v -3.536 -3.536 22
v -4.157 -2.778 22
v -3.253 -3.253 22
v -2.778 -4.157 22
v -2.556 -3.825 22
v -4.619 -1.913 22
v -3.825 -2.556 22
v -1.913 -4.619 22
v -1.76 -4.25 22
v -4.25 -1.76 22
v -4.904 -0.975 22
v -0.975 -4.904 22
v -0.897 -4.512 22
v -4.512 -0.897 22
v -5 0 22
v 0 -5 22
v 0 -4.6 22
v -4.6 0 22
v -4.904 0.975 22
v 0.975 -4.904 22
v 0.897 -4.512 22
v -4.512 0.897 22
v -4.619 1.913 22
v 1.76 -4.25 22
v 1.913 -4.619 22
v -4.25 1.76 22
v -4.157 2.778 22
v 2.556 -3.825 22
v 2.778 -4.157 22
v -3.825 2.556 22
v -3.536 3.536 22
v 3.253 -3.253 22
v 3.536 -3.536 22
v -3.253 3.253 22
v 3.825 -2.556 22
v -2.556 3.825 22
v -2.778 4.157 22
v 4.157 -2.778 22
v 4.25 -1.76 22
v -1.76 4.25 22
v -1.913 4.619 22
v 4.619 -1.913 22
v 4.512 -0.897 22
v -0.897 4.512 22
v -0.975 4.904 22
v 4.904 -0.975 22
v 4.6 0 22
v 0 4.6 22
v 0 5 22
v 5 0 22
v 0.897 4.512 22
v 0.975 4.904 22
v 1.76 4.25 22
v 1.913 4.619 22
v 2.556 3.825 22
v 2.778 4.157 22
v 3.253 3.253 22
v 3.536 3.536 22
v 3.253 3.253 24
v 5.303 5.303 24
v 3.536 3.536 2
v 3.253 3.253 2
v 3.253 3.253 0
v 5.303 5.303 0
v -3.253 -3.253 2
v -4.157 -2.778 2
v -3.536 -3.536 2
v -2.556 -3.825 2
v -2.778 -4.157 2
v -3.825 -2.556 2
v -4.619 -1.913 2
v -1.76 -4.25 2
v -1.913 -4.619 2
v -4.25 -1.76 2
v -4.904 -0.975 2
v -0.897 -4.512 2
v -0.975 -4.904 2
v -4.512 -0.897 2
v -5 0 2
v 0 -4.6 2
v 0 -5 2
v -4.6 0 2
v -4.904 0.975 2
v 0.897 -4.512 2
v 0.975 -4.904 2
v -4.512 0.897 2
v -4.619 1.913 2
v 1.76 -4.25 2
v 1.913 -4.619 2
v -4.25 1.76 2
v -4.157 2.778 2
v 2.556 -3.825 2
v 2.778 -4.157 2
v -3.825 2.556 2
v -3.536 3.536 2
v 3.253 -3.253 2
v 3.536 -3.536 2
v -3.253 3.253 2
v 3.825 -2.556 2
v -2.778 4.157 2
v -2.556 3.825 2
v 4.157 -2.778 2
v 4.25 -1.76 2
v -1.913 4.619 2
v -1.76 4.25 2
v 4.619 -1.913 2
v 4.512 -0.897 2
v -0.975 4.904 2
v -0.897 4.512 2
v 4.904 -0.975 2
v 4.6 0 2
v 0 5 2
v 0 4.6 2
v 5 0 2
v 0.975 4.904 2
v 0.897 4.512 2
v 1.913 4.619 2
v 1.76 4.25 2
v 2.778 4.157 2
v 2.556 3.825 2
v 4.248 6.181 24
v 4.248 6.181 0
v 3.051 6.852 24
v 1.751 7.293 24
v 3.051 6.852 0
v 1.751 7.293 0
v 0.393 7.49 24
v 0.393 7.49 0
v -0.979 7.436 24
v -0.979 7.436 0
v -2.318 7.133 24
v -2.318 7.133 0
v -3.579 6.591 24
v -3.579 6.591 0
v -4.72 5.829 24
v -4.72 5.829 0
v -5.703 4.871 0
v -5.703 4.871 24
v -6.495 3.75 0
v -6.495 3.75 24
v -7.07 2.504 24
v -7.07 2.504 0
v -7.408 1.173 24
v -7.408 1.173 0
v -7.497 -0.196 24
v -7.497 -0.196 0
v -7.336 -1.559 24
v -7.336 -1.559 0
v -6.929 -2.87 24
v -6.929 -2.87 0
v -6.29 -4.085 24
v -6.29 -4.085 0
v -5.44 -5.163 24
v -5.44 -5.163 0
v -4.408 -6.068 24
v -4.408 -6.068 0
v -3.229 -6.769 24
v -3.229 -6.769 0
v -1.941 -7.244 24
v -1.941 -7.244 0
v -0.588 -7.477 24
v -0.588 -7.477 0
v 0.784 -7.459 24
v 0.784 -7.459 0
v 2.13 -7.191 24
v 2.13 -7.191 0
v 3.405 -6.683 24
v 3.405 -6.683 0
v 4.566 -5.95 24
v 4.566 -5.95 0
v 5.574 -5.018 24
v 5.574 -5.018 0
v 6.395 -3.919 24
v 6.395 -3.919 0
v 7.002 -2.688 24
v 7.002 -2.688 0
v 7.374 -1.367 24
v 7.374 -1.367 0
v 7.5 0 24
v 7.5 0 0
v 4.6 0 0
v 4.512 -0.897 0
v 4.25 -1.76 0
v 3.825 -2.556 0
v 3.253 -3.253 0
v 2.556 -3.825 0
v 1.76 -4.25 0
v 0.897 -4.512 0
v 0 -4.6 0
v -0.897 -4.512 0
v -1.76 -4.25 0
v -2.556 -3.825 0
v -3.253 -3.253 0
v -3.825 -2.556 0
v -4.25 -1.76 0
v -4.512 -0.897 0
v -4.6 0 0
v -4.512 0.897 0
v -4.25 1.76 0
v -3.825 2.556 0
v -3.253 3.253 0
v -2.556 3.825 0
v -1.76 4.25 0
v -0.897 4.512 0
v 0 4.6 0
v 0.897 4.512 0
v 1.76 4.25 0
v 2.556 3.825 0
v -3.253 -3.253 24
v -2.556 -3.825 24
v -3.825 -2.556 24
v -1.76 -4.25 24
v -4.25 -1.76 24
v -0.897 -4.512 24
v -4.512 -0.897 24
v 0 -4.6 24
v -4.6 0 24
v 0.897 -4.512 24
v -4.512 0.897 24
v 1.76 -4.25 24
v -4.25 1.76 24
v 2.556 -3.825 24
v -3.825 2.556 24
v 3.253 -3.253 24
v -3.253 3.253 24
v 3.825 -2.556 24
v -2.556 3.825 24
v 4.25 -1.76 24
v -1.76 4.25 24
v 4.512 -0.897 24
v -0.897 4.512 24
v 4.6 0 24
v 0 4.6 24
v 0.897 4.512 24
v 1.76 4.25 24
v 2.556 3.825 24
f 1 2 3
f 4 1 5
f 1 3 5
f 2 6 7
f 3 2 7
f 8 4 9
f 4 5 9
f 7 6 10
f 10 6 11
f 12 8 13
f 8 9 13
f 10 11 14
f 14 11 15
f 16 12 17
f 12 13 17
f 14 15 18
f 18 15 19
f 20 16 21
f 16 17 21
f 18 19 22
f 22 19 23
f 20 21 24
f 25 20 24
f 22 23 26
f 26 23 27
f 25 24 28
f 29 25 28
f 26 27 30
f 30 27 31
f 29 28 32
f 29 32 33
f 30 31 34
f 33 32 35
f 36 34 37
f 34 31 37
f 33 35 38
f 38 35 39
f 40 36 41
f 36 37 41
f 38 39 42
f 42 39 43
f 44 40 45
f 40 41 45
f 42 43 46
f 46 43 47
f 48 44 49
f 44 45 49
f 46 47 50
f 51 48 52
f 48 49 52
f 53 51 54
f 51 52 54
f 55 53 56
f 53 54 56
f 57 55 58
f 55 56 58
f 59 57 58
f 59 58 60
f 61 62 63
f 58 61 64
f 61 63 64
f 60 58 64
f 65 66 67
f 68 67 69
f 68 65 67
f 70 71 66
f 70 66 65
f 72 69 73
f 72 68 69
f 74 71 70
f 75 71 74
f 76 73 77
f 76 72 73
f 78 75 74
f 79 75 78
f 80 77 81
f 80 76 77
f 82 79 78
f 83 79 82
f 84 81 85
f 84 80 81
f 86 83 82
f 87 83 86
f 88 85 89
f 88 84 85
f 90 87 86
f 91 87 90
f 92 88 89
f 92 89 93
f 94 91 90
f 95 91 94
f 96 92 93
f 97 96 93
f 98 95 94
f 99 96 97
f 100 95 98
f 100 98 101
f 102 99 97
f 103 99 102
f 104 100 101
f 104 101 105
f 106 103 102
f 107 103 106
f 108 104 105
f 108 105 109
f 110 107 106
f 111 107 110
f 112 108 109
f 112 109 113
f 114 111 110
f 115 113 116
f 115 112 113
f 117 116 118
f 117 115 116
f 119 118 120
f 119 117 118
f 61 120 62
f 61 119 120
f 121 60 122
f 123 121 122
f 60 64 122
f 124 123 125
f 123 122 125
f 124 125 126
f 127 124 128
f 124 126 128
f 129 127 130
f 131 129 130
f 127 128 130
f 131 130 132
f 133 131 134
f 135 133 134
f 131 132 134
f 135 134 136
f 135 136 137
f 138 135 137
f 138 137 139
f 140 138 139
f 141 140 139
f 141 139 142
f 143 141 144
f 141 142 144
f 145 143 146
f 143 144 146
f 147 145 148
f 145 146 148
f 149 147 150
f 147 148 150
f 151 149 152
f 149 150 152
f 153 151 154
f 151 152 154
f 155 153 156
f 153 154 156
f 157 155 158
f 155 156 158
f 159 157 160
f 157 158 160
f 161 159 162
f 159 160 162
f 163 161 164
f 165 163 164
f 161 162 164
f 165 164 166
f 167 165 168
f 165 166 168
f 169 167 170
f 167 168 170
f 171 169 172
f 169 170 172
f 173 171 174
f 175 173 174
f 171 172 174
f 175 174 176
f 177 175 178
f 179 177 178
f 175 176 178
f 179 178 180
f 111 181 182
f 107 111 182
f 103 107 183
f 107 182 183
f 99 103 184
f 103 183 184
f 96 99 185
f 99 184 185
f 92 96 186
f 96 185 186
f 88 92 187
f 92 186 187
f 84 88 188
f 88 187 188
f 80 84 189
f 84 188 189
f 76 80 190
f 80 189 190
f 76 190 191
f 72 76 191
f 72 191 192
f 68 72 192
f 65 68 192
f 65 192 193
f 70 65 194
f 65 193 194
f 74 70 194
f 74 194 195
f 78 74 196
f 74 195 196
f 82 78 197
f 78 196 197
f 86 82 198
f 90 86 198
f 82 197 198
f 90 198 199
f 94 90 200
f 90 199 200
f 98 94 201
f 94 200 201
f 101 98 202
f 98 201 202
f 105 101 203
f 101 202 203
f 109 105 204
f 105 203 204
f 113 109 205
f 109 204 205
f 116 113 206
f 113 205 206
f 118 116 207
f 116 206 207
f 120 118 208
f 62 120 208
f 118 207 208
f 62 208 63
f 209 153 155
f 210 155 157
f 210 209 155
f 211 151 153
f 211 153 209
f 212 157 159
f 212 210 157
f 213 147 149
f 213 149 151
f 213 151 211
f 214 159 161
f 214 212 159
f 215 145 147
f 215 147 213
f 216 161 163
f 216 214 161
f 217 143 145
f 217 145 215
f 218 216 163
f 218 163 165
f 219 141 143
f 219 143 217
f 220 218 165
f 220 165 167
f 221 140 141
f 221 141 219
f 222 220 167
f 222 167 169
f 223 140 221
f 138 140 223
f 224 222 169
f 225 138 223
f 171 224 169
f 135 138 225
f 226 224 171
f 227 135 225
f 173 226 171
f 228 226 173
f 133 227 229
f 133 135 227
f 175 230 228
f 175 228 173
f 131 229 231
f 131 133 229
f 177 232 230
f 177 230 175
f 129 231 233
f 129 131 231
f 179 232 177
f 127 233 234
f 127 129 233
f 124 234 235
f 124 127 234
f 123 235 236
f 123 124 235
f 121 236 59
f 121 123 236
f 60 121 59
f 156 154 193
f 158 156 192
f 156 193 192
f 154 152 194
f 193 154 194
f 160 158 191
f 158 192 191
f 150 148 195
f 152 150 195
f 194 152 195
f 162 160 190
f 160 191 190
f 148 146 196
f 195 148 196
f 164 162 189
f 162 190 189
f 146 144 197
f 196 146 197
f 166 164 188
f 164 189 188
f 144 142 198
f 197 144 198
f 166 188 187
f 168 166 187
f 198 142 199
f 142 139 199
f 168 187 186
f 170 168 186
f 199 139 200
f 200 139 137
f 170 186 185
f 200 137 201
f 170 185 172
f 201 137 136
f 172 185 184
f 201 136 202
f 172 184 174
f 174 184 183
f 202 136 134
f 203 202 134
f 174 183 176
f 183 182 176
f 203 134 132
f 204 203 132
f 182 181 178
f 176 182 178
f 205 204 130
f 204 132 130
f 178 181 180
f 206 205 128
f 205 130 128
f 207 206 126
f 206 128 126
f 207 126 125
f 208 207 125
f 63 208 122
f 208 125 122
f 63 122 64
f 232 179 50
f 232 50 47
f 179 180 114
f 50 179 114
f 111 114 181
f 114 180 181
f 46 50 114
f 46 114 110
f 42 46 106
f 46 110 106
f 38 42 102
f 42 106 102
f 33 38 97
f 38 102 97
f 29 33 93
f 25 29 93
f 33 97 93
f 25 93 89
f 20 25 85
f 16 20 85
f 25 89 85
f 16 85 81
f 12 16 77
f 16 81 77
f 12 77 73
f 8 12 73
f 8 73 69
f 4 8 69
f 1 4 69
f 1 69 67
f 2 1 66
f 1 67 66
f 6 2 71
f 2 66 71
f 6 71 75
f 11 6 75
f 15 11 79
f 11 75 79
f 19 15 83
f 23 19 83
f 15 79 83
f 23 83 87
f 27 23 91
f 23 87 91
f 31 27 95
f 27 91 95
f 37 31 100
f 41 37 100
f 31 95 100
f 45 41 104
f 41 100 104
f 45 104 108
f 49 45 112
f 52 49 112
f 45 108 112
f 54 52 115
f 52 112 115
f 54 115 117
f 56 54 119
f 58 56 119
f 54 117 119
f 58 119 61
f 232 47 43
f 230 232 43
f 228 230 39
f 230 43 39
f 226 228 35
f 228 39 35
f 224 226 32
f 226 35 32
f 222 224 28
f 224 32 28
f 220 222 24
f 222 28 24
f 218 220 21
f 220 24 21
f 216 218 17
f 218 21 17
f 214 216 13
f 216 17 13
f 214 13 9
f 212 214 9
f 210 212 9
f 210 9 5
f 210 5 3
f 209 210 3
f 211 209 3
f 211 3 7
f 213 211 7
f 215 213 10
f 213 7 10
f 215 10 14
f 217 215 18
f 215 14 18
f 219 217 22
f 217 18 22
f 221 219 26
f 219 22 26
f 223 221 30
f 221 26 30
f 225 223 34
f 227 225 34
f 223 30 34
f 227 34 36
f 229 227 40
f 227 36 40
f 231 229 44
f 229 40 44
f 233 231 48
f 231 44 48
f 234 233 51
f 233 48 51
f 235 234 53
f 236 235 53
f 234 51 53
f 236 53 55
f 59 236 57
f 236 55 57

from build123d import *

# Parameters (mm, degrees)
F1_DEPTH = 2
F3_DEPTH = 20
F5_DEPTH = 2


with BuildPart() as f1:
    # F0 (on Top) → F1 (new body)
    with BuildSketch(Plane.XY):
        with BuildLine():
            ThreePointArc((5.3033008589, 5.3033008589), (-6.9290964938, -2.8701257427), (7.5, 0))
            Line((7.5, 0), (5, 0))
            ThreePointArc((5, 0), (-4.6193976626, -1.9134171618), (3.5355339059, 3.5355339059))
            Line((3.5355339059, 3.5355339059), (5.3033008589, 5.3033008589))
        make_face()
        with BuildLine():
            ThreePointArc((3.5355339059, 3.5355339059), (-4.6193976626, -1.9134171618), (5, 0))
            Line((5, 0), (4.6, 0))
            ThreePointArc((4.6, 0), (-4.2498458496, -1.7603437889), (3.2526911935, 3.2526911935))
            Line((3.2526911935, 3.2526911935), (3.5355339059, 3.5355339059))
        make_face()
    extrude(amount=F1_DEPTH)

    # F2 (on face) → F3 (join)
    with BuildSketch(Plane.XY.offset(2)):
        with BuildLine():
            Line((7.5, 0), (5, 0))
            ThreePointArc((5, 0), (-4.6193976626, -1.9134171618), (3.5355339059, 3.5355339059))
            Line((3.5355339059, 3.5355339059), (5.3033008589, 5.3033008589))
            ThreePointArc((5.3033008589, 5.3033008589), (-6.9290964938, -2.8701257427), (7.5, 0))
        make_face()
    extrude(amount=F3_DEPTH)

    # F4 (on face) → F5 (join)
    with BuildSketch(Plane.XY.offset(22)):
        with BuildLine():
            ThreePointArc((3.5355339059, 3.5355339059), (-4.6193976626, -1.9134171618), (5, 0))
            Line((5, 0), (4.6, 0))
            ThreePointArc((4.6, 0), (-4.2498458496, -1.7603437889), (3.2526911935, 3.2526911935))
            Line((3.2526911935, 3.2526911935), (3.5355339059, 3.5355339059))
        make_face()
        with BuildLine():
            ThreePointArc((5.3033008589, 5.3033008589), (-6.9290964938, -2.8701257427), (7.5, 0))
            Line((7.5, 0), (5, 0))
            ThreePointArc((5, 0), (-4.6193976626, -1.9134171618), (3.5355339059, 3.5355339059))
            Line((3.5355339059, 3.5355339059), (5.3033008589, 5.3033008589))
        make_face()
    extrude(amount=F5_DEPTH)


solid = f1.part
